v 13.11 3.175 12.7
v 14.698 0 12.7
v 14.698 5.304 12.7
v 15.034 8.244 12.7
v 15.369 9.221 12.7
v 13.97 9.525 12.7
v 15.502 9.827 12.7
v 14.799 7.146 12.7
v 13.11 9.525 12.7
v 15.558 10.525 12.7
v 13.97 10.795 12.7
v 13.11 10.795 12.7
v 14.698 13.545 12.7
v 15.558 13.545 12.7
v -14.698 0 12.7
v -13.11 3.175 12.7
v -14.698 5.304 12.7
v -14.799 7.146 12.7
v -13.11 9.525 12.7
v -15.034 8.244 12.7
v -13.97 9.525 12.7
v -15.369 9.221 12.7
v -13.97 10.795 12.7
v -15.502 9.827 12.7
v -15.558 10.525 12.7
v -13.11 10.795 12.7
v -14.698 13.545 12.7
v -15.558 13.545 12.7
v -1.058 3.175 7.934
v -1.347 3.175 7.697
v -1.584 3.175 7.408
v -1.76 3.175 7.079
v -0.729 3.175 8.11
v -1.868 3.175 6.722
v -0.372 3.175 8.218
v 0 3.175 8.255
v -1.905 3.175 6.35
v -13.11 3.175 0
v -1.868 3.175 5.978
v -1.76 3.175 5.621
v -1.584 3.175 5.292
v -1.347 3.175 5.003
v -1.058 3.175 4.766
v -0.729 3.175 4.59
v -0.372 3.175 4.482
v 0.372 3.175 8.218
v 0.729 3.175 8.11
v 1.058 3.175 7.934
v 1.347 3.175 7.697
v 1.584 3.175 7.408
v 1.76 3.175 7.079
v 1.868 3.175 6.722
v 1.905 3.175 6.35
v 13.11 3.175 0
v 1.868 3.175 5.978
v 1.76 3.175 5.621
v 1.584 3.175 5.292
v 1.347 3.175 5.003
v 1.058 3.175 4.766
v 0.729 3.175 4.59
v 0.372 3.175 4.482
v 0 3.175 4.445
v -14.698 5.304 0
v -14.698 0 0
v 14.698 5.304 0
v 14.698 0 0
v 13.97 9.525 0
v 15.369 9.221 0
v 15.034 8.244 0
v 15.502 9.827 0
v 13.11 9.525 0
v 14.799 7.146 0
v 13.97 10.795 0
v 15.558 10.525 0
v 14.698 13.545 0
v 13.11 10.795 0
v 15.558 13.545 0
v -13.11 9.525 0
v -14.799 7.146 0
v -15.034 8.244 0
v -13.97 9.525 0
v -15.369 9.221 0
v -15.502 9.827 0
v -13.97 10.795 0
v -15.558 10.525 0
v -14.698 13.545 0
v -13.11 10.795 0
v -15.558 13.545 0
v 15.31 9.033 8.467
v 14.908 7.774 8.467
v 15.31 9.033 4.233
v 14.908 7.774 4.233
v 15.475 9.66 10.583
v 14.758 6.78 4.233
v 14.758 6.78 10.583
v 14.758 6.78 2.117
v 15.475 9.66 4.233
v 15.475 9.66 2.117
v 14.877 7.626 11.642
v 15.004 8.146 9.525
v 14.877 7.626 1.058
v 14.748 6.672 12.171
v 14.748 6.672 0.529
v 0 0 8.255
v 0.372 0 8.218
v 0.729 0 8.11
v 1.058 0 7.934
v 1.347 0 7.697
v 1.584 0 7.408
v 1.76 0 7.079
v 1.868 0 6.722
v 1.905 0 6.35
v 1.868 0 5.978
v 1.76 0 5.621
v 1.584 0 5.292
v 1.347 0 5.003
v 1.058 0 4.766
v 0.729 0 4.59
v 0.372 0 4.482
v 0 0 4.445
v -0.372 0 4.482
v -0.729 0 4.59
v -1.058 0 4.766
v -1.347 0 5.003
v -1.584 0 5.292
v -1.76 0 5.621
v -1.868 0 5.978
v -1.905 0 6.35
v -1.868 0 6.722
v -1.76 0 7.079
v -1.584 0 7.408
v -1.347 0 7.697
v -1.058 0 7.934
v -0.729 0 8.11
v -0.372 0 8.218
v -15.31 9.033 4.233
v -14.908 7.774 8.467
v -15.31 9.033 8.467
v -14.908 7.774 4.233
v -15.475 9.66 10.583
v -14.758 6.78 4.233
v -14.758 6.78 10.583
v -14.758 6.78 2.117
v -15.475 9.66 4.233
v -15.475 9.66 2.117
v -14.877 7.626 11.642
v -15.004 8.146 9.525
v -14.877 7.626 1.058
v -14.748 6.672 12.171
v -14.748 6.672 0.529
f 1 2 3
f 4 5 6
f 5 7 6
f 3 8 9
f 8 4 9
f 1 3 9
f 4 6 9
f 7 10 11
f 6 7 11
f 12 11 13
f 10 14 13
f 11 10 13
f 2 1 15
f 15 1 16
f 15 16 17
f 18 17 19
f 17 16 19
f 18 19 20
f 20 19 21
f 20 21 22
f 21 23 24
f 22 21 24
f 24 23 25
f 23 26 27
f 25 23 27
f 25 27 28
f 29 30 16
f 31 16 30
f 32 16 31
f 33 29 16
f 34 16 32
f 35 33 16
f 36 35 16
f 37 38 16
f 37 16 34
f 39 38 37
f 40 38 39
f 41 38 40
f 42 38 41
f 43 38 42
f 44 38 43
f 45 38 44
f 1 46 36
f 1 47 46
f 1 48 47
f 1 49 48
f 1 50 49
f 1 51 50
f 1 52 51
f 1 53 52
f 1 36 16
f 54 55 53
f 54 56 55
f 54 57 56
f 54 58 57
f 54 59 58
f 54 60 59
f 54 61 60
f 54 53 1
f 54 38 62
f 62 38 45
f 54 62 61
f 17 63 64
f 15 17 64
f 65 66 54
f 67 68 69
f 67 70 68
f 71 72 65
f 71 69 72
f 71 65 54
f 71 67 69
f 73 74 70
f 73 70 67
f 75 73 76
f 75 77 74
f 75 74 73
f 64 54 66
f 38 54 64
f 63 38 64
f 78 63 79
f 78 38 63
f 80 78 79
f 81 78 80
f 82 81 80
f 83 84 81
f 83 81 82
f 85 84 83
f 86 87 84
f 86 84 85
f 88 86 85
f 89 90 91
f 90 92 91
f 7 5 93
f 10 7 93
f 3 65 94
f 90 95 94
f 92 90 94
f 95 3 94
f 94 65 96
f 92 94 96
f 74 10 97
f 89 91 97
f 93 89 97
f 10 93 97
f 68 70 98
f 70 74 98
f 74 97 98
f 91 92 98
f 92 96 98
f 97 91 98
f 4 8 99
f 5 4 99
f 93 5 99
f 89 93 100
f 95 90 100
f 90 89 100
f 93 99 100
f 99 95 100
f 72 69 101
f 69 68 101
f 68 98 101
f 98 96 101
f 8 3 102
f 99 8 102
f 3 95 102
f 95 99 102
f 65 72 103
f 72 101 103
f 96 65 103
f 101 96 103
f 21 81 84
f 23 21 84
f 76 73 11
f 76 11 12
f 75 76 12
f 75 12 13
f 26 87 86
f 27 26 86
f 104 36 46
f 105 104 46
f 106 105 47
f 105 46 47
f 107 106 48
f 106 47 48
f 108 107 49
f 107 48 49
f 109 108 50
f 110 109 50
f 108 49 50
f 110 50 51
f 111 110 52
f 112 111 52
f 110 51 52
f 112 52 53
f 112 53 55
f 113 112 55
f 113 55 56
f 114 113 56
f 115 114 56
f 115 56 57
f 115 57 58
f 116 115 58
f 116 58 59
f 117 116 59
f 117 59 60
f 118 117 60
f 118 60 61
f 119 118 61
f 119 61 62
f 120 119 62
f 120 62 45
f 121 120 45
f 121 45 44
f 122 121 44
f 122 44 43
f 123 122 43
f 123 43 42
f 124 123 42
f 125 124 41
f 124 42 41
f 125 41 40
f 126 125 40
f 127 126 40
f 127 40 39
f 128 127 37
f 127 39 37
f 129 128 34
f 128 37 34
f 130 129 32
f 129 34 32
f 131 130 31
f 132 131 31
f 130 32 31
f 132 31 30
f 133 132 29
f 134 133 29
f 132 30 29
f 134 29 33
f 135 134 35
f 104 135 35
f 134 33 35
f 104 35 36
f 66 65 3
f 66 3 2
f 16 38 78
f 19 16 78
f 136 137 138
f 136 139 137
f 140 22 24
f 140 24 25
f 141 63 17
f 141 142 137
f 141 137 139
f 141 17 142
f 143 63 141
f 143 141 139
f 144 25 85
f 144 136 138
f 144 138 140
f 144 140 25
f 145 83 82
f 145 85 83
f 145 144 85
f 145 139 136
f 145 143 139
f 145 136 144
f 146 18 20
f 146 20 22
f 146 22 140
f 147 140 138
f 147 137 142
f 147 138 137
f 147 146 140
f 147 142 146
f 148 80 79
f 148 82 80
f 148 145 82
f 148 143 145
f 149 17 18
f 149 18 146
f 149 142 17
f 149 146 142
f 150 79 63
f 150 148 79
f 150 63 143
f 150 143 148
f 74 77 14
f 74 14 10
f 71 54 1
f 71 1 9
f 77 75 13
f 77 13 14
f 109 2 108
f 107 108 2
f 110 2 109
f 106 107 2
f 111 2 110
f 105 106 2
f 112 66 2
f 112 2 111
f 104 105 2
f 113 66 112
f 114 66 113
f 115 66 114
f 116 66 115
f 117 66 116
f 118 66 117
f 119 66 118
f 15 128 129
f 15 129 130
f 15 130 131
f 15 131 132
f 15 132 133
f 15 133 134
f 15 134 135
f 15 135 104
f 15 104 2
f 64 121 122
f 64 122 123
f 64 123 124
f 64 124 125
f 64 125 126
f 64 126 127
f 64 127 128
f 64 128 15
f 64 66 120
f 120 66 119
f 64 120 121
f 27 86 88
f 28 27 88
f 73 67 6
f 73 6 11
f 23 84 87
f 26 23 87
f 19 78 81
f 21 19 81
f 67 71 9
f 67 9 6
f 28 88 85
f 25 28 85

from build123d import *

# Parameters (mm, degrees)
BOSS_EXTRUDE1_DEPTH = 12.7
SKETCH2_R           = 1.905
CUT_EXTRUDE1_DEPTH  = 12.7


with BuildPart() as part:
    # Sketch1 → Boss-Extrude1 (new body)
    with BuildSketch(Plane.XY):
        with BuildLine():
            Line((0, 0), (0, 3.175))
            Line((0, 3.175), (-13.110280444, 3.175))
            Line((-13.110280444, 3.175), (-13.110280444, 9.525))
            Line((-13.110280444, 9.525), (-13.97, 9.525))
            Line((-13.97, 9.525), (-13.97, 10.795))
            Line((-13.97, 10.795), (-13.110280444, 10.795))
            Line((-13.110280444, 10.795), (-14.697780444, 13.544630657))
            Line((-14.697780444, 13.544630657), (-15.5575, 13.544630657))
            Line((-15.5575, 13.544630657), (-15.5575, 10.524942302))
            add(Edge.make_bspline(
                [(-14.697780444, 5.304098901), (-14.697780444, 8.859756712), (-15.501871983, 8.436070985), (-15.5575, 10.524942302)],
                knots=[0, 0, 0, 0, 1, 1, 1, 1], degree=3))
            Line((-14.697780444, 5.304098901), (-14.697780444, 0))
            Line((-14.697780444, 0), (0, 0))
        make_face()
    boss_extrude1 = extrude(amount=BOSS_EXTRUDE1_DEPTH)

    # Mirror1: Boss-Extrude1 across plane
    add(boss_extrude1.mirror(Plane(origin=(0, 0, 0), x_dir=(0, 0, 1), z_dir=(1, 0, 0))))

    # Sketch2 → Cut-Extrude1 (cut)
    with BuildSketch(Plane(origin=(0, 3.175, 0), x_dir=(1, 0, 0), z_dir=(0, 1, 0))):
        with Locations(Location((0, -6.35, 0), (0, 0, 270))):
            Circle(SKETCH2_R)
    extrude(amount=-CUT_EXTRUDE1_DEPTH, mode=Mode.SUBTRACT)


solid = part.part
